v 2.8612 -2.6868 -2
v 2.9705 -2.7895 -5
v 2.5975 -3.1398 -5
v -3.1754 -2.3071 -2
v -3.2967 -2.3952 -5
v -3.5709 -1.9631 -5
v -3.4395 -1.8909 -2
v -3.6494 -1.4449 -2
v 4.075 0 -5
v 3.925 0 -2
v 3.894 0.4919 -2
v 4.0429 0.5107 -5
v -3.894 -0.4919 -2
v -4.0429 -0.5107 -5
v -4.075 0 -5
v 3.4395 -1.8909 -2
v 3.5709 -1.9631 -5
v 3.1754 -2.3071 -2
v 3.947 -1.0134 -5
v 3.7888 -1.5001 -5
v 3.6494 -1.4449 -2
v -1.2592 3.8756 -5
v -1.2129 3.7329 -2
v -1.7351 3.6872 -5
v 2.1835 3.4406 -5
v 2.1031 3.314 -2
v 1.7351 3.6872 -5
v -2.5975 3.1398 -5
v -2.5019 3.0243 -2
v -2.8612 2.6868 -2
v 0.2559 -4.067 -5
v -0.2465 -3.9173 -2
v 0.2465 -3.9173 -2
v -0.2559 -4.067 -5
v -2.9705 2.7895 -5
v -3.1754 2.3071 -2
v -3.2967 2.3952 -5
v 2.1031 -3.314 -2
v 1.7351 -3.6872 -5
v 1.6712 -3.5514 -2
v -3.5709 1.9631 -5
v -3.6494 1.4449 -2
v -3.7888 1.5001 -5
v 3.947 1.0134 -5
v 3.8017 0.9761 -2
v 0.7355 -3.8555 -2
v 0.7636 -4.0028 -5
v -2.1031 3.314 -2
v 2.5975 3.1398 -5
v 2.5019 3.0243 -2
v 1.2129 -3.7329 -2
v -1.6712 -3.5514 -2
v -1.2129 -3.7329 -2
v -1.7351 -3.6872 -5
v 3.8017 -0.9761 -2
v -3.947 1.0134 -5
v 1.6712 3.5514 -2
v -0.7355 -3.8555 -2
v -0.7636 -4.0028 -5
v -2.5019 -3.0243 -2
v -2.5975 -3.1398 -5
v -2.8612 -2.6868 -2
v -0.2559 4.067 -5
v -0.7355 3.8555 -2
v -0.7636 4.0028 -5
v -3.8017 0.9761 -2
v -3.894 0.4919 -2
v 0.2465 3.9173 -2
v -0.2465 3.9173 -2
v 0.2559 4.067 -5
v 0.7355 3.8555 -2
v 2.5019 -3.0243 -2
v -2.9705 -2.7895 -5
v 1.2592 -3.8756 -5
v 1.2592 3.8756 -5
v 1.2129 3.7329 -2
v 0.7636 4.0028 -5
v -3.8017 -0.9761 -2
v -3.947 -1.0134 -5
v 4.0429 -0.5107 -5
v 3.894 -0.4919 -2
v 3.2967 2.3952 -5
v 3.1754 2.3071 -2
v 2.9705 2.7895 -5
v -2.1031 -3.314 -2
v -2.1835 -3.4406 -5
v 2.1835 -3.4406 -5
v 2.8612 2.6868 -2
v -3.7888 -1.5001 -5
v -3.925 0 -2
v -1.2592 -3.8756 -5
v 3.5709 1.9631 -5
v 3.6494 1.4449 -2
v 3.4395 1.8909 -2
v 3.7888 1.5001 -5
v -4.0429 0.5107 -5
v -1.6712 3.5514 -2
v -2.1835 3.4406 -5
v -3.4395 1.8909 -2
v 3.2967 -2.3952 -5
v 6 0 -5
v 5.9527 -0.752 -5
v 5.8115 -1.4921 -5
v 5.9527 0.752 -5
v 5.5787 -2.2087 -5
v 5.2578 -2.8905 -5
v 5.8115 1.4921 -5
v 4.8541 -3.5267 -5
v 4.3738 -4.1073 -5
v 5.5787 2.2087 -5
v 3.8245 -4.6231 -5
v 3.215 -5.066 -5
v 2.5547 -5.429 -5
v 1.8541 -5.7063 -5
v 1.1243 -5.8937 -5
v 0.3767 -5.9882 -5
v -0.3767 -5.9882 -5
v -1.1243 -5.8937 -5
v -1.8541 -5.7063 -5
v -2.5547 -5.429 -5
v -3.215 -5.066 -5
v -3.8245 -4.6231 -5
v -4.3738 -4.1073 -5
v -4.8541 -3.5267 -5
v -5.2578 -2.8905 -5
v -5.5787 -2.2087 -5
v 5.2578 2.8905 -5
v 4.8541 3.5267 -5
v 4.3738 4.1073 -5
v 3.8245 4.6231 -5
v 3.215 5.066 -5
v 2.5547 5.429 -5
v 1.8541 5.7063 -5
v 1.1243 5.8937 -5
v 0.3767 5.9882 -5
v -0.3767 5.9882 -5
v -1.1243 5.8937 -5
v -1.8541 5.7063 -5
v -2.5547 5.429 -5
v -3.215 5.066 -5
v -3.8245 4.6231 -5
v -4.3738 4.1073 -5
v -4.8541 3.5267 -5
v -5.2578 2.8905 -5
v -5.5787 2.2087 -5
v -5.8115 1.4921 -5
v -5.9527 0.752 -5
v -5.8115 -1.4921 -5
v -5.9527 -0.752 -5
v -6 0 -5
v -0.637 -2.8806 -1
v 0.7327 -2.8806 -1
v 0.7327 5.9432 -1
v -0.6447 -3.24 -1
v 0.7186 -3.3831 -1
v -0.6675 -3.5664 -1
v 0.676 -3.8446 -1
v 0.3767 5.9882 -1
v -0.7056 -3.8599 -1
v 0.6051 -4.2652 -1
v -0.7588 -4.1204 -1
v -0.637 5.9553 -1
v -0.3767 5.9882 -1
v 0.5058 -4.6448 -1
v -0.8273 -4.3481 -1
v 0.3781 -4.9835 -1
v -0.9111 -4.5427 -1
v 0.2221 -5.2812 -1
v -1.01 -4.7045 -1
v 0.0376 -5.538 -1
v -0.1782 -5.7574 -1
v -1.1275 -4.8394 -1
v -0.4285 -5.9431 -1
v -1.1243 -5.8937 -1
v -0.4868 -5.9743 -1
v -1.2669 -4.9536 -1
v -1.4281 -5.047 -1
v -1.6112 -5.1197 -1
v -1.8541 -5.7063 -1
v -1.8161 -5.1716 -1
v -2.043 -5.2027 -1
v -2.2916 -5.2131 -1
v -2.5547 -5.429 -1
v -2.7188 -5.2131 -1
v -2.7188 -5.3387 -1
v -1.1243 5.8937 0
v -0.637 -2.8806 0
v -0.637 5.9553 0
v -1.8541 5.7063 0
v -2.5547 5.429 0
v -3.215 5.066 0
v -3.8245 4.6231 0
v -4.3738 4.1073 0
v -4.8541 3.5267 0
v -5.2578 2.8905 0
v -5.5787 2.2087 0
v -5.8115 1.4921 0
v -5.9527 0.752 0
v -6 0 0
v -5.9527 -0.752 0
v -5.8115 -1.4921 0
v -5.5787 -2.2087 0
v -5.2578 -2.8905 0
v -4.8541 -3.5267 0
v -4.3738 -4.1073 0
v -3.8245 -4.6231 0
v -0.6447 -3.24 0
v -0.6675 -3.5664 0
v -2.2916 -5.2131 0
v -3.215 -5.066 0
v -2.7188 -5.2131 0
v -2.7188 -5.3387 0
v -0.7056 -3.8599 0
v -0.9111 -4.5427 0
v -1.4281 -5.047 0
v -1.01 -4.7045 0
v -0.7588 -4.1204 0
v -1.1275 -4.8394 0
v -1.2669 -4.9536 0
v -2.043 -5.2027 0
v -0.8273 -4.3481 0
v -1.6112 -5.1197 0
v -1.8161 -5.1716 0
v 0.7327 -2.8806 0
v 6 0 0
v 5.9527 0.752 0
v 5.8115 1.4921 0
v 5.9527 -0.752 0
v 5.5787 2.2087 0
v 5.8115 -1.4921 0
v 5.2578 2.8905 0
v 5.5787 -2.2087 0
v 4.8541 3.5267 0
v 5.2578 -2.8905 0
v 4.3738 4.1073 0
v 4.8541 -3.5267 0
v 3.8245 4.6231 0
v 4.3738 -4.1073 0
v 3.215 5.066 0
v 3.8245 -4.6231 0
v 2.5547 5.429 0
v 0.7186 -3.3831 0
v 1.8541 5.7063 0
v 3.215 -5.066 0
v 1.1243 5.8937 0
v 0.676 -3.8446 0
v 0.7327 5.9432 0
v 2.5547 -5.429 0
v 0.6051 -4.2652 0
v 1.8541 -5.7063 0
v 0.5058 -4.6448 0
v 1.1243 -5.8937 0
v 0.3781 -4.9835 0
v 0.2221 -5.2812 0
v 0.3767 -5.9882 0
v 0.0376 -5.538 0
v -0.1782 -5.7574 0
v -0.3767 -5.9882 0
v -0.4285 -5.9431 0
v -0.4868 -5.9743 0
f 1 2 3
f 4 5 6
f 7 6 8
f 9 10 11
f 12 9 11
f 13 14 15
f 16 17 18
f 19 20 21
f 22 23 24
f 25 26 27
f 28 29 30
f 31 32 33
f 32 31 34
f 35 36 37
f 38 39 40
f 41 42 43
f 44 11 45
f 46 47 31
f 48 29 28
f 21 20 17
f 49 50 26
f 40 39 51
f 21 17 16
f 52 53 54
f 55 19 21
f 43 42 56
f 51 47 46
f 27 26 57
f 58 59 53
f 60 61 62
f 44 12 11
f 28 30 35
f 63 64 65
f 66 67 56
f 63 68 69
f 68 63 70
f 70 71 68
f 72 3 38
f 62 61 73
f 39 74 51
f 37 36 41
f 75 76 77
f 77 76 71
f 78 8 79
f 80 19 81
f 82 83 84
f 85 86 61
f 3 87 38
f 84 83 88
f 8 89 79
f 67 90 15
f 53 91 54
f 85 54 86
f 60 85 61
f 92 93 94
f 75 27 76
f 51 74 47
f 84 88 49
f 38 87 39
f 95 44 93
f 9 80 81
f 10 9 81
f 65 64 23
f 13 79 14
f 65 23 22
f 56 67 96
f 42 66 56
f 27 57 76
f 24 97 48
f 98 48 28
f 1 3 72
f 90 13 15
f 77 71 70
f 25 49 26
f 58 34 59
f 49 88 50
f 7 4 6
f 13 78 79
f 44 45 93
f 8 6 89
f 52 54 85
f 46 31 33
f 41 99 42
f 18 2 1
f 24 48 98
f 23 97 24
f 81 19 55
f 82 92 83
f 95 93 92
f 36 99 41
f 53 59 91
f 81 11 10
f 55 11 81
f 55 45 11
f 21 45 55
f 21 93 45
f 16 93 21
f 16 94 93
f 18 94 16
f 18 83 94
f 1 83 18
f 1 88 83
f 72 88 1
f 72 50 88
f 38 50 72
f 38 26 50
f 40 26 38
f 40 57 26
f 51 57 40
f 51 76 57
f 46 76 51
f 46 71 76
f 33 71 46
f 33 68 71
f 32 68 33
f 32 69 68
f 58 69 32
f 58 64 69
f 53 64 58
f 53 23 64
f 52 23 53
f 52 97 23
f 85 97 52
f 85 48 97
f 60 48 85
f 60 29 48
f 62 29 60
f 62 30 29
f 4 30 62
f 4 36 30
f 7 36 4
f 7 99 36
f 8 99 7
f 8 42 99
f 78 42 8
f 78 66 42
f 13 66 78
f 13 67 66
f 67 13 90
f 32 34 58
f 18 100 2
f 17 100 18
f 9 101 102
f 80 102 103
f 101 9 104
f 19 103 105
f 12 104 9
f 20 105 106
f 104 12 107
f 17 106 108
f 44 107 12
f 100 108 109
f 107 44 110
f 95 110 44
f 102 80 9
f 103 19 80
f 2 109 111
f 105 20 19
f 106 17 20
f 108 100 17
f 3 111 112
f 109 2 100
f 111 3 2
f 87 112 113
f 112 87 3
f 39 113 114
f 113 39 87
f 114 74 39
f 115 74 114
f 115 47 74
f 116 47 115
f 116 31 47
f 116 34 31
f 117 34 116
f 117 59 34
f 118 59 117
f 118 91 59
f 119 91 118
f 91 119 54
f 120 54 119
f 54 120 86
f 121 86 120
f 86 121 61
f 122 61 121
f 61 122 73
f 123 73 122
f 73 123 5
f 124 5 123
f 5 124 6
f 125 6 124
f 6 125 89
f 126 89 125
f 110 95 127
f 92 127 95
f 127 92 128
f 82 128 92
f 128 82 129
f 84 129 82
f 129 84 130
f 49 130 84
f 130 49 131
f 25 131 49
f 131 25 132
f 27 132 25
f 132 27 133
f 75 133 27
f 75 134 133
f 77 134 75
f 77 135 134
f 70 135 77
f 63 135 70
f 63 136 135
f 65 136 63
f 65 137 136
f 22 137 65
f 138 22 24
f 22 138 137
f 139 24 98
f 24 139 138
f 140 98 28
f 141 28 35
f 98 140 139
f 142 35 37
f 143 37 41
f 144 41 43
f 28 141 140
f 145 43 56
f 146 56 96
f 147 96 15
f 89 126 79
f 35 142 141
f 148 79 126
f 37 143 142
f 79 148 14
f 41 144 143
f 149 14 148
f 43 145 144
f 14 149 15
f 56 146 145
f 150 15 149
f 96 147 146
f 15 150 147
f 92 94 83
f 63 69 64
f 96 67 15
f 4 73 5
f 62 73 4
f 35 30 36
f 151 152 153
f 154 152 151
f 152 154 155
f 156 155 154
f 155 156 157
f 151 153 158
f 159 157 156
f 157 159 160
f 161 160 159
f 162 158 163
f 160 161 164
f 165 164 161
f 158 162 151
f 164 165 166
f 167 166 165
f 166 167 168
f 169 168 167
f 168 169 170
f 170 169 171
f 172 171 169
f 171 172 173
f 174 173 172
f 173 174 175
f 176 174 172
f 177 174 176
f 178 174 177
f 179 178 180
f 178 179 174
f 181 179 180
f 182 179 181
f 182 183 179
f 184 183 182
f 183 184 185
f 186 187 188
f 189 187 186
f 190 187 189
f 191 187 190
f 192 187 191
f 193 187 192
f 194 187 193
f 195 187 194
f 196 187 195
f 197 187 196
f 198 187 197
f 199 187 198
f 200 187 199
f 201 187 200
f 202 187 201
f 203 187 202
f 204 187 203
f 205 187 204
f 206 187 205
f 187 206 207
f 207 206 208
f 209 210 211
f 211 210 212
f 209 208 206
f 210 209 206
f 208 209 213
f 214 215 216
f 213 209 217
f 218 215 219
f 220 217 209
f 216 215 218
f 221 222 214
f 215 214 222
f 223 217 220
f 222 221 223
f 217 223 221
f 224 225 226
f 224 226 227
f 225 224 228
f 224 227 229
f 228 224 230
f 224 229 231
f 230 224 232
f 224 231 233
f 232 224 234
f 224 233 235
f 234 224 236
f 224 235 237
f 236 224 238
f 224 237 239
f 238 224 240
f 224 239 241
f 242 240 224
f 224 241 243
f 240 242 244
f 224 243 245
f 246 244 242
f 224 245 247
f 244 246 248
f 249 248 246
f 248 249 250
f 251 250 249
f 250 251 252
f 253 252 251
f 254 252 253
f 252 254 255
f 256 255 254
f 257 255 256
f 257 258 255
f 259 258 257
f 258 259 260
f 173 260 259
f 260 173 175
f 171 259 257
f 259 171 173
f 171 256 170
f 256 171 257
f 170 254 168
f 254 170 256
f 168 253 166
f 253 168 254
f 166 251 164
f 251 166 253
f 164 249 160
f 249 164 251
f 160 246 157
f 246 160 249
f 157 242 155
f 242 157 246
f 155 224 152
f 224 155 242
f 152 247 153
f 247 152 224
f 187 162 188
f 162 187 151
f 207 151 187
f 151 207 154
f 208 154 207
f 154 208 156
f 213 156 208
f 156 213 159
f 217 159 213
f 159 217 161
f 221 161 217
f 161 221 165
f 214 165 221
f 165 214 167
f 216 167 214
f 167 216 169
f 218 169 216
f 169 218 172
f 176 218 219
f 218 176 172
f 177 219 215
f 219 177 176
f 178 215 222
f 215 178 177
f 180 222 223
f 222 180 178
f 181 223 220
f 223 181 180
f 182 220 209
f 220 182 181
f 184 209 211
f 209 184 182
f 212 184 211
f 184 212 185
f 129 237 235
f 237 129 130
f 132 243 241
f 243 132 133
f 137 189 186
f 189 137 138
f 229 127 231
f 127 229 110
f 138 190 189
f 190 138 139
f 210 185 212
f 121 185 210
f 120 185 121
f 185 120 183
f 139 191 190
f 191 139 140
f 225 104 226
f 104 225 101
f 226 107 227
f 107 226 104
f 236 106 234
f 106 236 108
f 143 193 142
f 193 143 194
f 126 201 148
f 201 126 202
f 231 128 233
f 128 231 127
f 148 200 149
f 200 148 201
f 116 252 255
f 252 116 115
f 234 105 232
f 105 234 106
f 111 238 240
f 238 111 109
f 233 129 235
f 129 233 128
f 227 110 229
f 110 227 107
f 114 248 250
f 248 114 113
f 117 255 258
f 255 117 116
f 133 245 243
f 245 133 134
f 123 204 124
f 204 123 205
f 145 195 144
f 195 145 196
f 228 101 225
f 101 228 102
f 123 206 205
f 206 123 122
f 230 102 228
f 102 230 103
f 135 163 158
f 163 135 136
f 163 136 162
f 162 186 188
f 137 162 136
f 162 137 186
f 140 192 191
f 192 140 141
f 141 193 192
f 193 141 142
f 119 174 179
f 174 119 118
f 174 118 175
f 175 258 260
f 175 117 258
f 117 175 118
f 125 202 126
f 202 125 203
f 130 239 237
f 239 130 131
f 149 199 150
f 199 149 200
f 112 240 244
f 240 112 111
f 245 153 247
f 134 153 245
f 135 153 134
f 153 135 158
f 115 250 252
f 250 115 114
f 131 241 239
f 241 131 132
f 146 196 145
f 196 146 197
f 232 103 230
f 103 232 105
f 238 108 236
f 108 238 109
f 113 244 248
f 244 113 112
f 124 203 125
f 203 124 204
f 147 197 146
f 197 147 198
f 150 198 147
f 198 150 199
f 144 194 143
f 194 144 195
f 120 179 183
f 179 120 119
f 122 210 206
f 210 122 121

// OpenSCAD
$fn = 50;

difference() {
	union() {
		translate(v = [0, 0, -5.0]) {
			cylinder(h = 5, r = 6.0);
		}
	}
	union() {
		#translate(v = [0, 0, -5.0]) {
			cylinder(h = 3, r1 = 4.075, r2 = 3.925);
		}
		translate(v = [0, 0, -1]) {
			linear_extrude(height = 1) {
				text(font = "Impact", halign = "center", size = 10, text = "J", valign = "center");
			}
		}
	}
}
